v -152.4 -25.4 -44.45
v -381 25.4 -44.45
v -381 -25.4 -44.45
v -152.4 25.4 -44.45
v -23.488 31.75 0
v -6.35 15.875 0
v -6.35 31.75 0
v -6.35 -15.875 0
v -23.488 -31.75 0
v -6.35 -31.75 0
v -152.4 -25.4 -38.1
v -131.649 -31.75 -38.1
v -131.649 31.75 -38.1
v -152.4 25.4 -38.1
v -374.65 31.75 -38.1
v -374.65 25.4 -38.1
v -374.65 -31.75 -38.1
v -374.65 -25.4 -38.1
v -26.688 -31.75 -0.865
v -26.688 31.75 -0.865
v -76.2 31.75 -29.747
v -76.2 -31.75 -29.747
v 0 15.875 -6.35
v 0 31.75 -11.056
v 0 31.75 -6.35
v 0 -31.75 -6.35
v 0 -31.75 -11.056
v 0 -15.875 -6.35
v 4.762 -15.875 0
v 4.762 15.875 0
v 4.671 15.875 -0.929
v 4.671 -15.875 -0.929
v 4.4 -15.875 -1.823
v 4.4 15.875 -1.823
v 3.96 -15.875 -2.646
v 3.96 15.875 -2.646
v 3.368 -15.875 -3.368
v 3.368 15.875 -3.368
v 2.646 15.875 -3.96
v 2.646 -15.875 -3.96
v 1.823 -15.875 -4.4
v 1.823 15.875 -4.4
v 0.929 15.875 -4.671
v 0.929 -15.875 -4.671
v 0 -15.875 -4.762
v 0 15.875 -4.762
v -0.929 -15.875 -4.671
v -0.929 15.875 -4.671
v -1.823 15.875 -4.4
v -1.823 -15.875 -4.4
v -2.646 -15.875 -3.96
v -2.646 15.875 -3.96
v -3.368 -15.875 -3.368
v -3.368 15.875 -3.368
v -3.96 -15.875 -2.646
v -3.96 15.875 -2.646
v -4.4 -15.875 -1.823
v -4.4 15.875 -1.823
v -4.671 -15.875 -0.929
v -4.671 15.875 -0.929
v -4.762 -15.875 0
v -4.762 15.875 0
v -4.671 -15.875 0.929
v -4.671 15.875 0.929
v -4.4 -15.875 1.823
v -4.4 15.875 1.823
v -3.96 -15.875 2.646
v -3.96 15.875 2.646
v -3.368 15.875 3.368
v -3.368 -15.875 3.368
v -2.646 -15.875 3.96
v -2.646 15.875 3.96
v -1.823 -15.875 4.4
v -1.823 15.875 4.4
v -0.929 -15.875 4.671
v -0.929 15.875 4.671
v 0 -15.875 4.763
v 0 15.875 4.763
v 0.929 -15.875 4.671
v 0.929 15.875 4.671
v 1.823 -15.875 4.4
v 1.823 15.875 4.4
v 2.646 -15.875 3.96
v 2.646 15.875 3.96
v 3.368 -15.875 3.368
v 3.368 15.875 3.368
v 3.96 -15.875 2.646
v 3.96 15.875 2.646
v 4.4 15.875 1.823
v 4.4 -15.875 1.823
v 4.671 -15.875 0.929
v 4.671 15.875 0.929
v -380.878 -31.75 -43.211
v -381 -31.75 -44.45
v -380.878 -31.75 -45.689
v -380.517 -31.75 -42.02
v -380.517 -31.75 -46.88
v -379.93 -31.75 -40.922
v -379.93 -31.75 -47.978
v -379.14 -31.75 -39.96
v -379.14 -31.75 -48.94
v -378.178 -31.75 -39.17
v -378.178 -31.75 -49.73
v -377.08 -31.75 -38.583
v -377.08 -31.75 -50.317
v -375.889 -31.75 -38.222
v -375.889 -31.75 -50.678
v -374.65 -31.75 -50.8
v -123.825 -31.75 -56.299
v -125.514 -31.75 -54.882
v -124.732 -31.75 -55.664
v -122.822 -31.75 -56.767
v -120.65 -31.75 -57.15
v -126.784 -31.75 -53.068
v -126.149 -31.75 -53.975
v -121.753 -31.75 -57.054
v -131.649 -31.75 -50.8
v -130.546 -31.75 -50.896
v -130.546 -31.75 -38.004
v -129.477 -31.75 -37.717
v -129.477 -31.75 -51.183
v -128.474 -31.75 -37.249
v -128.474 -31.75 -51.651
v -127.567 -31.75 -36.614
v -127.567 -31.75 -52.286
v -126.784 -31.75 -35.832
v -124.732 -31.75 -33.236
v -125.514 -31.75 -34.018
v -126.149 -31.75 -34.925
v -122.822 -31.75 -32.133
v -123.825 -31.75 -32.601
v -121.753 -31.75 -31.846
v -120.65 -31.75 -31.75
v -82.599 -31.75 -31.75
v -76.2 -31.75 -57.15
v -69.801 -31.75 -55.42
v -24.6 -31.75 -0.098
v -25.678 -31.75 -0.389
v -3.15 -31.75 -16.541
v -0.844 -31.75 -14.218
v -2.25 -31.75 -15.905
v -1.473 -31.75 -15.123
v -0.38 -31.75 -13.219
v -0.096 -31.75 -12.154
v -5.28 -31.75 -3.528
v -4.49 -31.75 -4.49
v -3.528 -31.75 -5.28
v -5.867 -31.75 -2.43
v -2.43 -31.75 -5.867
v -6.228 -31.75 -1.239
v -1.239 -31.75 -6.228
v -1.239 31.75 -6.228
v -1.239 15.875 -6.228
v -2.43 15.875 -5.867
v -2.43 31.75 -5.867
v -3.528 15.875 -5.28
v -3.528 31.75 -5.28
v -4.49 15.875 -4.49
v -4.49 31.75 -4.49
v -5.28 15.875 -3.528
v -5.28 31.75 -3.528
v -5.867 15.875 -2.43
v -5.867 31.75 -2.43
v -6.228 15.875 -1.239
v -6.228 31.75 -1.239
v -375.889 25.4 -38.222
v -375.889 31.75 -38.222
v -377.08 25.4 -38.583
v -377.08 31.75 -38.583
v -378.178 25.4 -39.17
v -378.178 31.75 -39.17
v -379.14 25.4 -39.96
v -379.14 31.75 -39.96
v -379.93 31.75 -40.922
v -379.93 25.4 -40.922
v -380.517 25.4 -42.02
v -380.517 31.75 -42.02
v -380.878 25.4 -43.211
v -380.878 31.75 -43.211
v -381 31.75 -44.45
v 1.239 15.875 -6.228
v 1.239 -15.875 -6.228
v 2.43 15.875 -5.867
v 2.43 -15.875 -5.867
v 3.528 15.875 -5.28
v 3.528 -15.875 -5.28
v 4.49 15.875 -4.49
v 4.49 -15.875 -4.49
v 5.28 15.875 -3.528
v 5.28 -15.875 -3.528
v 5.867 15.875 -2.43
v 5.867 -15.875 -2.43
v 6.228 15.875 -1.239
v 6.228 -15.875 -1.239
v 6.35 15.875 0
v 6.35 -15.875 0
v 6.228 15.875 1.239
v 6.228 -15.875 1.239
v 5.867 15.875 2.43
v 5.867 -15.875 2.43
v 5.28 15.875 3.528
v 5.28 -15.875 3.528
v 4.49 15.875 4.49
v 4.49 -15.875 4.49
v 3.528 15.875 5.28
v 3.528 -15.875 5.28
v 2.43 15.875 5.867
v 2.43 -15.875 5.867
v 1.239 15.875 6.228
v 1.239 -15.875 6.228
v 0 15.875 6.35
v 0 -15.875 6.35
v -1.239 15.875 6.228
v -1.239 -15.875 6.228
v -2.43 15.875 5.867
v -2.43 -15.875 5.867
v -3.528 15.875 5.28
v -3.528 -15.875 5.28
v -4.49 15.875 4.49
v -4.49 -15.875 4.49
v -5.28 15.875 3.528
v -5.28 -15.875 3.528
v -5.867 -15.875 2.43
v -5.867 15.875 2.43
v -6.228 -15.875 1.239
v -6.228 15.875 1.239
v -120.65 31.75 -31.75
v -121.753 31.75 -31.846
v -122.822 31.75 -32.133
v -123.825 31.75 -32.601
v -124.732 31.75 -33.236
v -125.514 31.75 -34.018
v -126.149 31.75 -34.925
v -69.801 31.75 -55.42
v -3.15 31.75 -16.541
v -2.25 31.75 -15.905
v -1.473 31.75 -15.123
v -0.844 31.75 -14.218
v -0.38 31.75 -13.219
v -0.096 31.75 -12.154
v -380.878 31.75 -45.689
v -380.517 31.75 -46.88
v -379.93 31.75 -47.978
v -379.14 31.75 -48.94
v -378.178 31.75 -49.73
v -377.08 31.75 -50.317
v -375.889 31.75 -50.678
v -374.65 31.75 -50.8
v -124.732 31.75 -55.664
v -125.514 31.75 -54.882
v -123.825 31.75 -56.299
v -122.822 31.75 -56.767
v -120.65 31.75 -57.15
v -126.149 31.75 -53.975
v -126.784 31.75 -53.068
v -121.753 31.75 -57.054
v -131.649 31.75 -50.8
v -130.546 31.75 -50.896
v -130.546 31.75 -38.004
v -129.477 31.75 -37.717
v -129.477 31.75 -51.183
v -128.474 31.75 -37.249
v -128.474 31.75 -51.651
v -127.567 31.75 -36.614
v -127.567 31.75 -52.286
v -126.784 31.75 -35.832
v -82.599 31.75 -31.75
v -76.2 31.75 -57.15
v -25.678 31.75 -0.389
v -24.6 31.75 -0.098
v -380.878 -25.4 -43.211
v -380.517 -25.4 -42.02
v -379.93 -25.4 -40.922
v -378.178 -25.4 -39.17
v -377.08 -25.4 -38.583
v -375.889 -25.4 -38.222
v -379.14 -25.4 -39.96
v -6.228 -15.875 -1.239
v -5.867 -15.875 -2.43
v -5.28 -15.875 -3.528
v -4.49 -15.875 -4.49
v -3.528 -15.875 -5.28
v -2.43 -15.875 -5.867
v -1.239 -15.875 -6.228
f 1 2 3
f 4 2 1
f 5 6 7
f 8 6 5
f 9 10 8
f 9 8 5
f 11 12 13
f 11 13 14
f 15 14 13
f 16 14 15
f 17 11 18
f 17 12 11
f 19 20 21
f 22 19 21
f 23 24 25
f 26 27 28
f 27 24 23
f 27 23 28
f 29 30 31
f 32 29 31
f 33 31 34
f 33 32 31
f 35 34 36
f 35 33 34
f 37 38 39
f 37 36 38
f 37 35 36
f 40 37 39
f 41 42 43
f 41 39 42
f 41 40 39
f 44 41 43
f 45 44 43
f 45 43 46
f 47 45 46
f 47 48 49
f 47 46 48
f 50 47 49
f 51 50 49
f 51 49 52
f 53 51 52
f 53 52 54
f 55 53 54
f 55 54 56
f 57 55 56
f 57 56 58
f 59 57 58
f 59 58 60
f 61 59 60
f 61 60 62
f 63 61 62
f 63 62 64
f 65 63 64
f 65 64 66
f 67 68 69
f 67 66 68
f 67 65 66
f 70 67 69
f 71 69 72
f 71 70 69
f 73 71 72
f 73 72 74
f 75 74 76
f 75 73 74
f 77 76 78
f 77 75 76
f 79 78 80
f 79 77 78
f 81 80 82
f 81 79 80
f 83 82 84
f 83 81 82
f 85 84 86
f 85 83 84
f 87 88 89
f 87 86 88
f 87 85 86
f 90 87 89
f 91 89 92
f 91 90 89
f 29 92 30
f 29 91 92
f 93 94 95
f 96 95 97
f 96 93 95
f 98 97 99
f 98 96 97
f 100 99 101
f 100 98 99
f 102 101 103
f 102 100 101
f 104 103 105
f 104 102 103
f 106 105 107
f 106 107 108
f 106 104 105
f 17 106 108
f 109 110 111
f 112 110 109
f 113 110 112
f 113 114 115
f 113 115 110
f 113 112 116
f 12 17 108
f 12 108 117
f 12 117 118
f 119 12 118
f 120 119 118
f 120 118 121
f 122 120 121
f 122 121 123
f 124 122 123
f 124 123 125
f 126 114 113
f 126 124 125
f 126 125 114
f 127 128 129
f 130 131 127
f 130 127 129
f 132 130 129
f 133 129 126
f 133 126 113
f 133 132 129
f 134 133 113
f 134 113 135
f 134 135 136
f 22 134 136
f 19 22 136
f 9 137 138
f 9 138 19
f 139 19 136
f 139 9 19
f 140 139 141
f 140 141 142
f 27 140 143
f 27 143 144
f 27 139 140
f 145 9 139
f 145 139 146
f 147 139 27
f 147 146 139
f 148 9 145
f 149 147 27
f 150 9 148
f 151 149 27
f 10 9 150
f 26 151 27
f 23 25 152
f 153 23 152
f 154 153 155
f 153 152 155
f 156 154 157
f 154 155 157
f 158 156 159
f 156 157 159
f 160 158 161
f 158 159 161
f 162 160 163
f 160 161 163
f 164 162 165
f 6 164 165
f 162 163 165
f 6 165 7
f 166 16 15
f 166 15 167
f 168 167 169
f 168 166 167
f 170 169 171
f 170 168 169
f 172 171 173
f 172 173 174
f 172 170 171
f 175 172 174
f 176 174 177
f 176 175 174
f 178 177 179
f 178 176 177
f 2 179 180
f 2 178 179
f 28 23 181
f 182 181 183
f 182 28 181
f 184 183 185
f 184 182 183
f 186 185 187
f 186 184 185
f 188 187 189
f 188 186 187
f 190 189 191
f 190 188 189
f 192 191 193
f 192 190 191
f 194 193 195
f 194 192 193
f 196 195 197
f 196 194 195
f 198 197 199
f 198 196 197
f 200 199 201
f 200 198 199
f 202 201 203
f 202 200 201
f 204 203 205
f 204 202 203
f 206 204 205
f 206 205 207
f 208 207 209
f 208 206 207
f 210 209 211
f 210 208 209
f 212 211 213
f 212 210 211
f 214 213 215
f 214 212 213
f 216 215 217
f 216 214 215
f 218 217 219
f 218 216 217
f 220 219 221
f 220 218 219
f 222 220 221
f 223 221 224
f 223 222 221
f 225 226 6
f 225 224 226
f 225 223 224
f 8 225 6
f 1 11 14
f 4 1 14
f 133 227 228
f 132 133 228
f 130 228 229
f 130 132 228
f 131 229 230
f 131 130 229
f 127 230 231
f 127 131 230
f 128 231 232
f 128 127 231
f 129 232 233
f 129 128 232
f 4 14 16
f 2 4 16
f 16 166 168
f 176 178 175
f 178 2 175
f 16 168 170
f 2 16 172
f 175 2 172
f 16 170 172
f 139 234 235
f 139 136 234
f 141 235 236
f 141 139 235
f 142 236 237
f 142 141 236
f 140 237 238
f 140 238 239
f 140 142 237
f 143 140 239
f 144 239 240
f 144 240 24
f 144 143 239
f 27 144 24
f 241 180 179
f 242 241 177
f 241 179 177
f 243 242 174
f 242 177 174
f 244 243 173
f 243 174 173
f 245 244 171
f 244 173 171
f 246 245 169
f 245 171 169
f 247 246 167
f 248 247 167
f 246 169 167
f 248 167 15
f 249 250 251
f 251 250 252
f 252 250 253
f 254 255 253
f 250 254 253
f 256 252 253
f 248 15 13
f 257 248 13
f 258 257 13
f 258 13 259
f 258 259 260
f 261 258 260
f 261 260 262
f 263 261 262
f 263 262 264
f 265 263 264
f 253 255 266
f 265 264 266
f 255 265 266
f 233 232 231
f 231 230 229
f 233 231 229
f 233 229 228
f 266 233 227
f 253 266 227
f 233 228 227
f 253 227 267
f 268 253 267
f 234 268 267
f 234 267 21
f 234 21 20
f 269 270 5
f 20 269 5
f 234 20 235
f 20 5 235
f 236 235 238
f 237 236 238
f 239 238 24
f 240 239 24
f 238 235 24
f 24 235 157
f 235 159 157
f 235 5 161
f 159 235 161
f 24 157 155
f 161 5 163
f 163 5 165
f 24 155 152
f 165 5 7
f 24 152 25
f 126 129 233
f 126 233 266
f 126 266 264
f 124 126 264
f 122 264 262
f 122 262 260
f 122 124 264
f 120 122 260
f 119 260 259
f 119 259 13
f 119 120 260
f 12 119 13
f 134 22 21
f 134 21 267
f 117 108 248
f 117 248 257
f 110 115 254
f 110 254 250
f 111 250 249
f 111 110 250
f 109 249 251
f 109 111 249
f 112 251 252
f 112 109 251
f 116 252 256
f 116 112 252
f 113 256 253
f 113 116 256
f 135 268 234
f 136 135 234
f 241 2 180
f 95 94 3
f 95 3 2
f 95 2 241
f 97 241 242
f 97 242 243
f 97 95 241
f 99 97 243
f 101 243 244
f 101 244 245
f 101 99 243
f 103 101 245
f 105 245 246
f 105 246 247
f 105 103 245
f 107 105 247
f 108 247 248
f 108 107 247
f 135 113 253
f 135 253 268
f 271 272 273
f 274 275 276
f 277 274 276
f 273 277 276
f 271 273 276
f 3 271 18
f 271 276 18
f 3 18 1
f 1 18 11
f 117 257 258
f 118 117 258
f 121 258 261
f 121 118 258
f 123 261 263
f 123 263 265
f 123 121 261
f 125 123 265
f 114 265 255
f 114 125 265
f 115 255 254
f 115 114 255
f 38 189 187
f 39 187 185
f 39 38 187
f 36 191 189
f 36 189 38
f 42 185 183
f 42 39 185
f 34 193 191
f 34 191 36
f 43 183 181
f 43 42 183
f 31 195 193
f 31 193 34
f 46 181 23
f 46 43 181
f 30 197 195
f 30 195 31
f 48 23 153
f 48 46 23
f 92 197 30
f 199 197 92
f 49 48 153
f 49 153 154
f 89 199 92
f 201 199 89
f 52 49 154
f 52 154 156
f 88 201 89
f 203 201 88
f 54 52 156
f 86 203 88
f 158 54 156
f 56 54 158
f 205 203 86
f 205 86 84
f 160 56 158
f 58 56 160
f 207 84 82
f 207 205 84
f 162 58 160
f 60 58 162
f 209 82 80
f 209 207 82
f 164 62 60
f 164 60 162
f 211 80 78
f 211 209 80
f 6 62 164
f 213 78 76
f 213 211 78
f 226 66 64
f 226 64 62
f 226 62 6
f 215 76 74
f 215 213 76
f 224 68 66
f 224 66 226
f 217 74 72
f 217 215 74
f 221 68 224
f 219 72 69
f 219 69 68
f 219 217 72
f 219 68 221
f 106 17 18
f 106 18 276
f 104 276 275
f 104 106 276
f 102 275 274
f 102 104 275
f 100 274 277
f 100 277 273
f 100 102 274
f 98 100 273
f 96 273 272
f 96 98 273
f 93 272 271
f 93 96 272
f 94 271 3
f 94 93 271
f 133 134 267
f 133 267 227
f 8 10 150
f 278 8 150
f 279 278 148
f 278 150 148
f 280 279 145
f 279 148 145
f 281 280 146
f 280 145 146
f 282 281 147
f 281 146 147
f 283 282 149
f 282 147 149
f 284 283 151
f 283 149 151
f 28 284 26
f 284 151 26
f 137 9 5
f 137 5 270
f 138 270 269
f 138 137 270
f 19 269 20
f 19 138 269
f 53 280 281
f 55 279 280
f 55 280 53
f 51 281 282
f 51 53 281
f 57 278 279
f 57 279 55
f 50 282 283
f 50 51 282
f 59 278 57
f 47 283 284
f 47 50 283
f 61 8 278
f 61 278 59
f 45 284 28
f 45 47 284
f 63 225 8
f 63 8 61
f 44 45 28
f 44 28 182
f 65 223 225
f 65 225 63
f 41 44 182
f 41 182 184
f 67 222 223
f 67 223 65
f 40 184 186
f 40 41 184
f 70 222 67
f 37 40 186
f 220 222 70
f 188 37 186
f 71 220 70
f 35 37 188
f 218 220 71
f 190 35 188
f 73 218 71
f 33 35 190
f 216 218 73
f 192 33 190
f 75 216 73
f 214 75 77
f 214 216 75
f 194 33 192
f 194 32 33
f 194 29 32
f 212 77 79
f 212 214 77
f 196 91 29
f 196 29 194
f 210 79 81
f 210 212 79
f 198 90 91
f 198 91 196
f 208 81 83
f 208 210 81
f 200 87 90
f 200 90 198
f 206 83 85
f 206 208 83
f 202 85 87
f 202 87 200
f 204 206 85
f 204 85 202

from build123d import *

# Parameters (mm, degrees)
F1_DEPTH      = 31.75
F1_DEPTH_BACK = 31.75
F2_DEPTH      = 25.4
F2_DEPTH_BACK = 25.4
F3_R          = 6.35
F4_DEPTH      = 15.875
F5_R          = 6.35
F6_DEPTH      = 15.875
F7_W          = 186.001042
F7_H          = 50.8
F7_W_2        = 67.998958
F8_DEPTH      = 44.45


with BuildPart() as f1:
    # F0 (on Front) → F1 (new body, two sides)
    with BuildSketch(Plane.XZ) as f1_sk:
        with BuildLine():
            Line((0, -11.055585), (0, -6.35))
            ThreePointArc((0, -6.35), (4.490128, 4.490128), (-6.35, 0))
            Line((-6.35, 0), (-23.488146, 0))
            ThreePointArc((-23.488146, 0), (-25.145368, -0.220064), (-26.687727, -0.865004))
            Line((-26.687727, -0.865004), (-76.2, -29.747163))
            Line((-76.2, -29.747163), (-82.599162, -31.75))
            Line((-82.599162, -31.75), (-120.65, -31.75))
            ThreePointArc((-120.65, -31.75), (-123.825, -32.600739), (-126.149261, -34.925))
            ThreePointArc((-126.149261, -34.925), (-128.473523, -37.249261), (-131.648523, -38.1))
            Line((-131.648523, -38.1), (-152.4, -38.1))
            Line((-152.4, -38.1), (-355.6, -38.1))
            Line((-355.6, -38.1), (-374.65, -38.1))
            ThreePointArc((-374.65, -38.1), (-379.140128, -39.959872), (-381, -44.45))
            ThreePointArc((-381, -44.45), (-379.140128, -48.940128), (-374.65, -50.8))
            Line((-374.65, -50.8), (-131.648523, -50.8))
            ThreePointArc((-131.648523, -50.8), (-128.473523, -51.650739), (-126.149261, -53.975))
            ThreePointArc((-126.149261, -53.975), (-123.825, -56.299261), (-120.65, -57.15))
            Line((-120.65, -57.15), (-76.2, -57.15))
            Line((-76.2, -57.15), (-69.800838, -55.419992))
            Line((-69.800838, -55.419992), (-3.150419, -16.540581))
            ThreePointArc((-3.150419, -16.540581), (-0.843647, -14.218271), (0, -11.055585))
        make_face()
        with BuildLine():
            ThreePointArc((-4.7625, 0), (0, 4.7625), (4.7625, 0))
            ThreePointArc((4.7625, 0), (0, -4.7625), (-4.7625, 0))
        make_face(mode=Mode.SUBTRACT)
    extrude(amount=F1_DEPTH)
    extrude(f1_sk.sketch, amount=-F1_DEPTH_BACK)

    # F0 (on Front) → F2 (join, two sides)
    with BuildSketch(Plane.XZ) as f2_sk:
        with BuildLine():
            ThreePointArc((-4.7625, 0), (0, -4.7625), (4.7625, 0))
            ThreePointArc((4.7625, 0), (0, 4.7625), (-4.7625, 0))
        make_face()
        with BuildLine():
            Line((0, -11.055585), (0, -6.35))
            ThreePointArc((0, -6.35), (4.490128, 4.490128), (-6.35, 0))
            Line((-6.35, 0), (-23.488146, 0))
            ThreePointArc((-23.488146, 0), (-25.145368, -0.220064), (-26.687727, -0.865004))
            Line((-26.687727, -0.865004), (-76.2, -29.747163))
            Line((-76.2, -29.747163), (-82.599162, -31.75))
            Line((-82.599162, -31.75), (-120.65, -31.75))
            ThreePointArc((-120.65, -31.75), (-123.825, -32.600739), (-126.149261, -34.925))
            ThreePointArc((-126.149261, -34.925), (-128.473523, -37.249261), (-131.648523, -38.1))
            Line((-131.648523, -38.1), (-152.4, -38.1))
            Line((-152.4, -38.1), (-355.6, -38.1))
            Line((-355.6, -38.1), (-374.65, -38.1))
            ThreePointArc((-374.65, -38.1), (-379.140128, -39.959872), (-381, -44.45))
            ThreePointArc((-381, -44.45), (-379.140128, -48.940128), (-374.65, -50.8))
            Line((-374.65, -50.8), (-131.648523, -50.8))
            ThreePointArc((-131.648523, -50.8), (-128.473523, -51.650739), (-126.149261, -53.975))
            ThreePointArc((-126.149261, -53.975), (-123.825, -56.299261), (-120.65, -57.15))
            Line((-120.65, -57.15), (-76.2, -57.15))
            Line((-76.2, -57.15), (-69.800838, -55.419992))
            Line((-69.800838, -55.419992), (-3.150419, -16.540581))
            ThreePointArc((-3.150419, -16.540581), (-0.843647, -14.218271), (0, -11.055585))
        make_face()
        with BuildLine():
            ThreePointArc((-4.7625, 0), (0, 4.7625), (4.7625, 0))
            ThreePointArc((4.7625, 0), (0, -4.7625), (-4.7625, 0))
        make_face(mode=Mode.SUBTRACT)
        with BuildLine():
            Line((-355.6, -38.1), (-152.4, -38.1))
            Line((-152.4, -38.1), (-152.4, 0))
            Line((-152.4, 0), (-220.398958, 0))
            ThreePointArc((-220.398958, 0), (-226.142749, -1.926679), (-229.562879, -6.927273))
            ThreePointArc((-229.562879, -6.927273), (-254, -25.4), (-278.437121, -6.927273))
            ThreePointArc((-278.437121, -6.927273), (-281.857251, -1.926679), (-287.601042, 0))
            Line((-287.601042, 0), (-355.6, 0))
            Line((-355.6, 0), (-355.6, -38.1))
        make_face()
    extrude(amount=F2_DEPTH)
    extrude(f2_sk.sketch, amount=-F2_DEPTH_BACK)

    # F3 (on face) → F4 (cut)
    with BuildSketch(Plane(origin=(0, 31.75, 0), x_dir=(-1, 0, 0), z_dir=(0, 1, 0))):
        Circle(F3_R)
    extrude(amount=-F4_DEPTH, mode=Mode.SUBTRACT)

    # F5 (on face) → F6 (cut)
    with BuildSketch(Plane.XZ.offset(31.75)):
        Circle(F5_R)
    extrude(amount=-F6_DEPTH, mode=Mode.SUBTRACT)

    # F7 (on face) → F8 (cut)
    with BuildSketch(Plane.XY):
        with Locations((-313.399479, 0)):
            Rectangle(F7_W, F7_H)
        with Locations((-186.399479, 0)):
            Rectangle(F7_W_2, F7_H)
    extrude(amount=-F8_DEPTH, mode=Mode.SUBTRACT)


solid = f1.part
